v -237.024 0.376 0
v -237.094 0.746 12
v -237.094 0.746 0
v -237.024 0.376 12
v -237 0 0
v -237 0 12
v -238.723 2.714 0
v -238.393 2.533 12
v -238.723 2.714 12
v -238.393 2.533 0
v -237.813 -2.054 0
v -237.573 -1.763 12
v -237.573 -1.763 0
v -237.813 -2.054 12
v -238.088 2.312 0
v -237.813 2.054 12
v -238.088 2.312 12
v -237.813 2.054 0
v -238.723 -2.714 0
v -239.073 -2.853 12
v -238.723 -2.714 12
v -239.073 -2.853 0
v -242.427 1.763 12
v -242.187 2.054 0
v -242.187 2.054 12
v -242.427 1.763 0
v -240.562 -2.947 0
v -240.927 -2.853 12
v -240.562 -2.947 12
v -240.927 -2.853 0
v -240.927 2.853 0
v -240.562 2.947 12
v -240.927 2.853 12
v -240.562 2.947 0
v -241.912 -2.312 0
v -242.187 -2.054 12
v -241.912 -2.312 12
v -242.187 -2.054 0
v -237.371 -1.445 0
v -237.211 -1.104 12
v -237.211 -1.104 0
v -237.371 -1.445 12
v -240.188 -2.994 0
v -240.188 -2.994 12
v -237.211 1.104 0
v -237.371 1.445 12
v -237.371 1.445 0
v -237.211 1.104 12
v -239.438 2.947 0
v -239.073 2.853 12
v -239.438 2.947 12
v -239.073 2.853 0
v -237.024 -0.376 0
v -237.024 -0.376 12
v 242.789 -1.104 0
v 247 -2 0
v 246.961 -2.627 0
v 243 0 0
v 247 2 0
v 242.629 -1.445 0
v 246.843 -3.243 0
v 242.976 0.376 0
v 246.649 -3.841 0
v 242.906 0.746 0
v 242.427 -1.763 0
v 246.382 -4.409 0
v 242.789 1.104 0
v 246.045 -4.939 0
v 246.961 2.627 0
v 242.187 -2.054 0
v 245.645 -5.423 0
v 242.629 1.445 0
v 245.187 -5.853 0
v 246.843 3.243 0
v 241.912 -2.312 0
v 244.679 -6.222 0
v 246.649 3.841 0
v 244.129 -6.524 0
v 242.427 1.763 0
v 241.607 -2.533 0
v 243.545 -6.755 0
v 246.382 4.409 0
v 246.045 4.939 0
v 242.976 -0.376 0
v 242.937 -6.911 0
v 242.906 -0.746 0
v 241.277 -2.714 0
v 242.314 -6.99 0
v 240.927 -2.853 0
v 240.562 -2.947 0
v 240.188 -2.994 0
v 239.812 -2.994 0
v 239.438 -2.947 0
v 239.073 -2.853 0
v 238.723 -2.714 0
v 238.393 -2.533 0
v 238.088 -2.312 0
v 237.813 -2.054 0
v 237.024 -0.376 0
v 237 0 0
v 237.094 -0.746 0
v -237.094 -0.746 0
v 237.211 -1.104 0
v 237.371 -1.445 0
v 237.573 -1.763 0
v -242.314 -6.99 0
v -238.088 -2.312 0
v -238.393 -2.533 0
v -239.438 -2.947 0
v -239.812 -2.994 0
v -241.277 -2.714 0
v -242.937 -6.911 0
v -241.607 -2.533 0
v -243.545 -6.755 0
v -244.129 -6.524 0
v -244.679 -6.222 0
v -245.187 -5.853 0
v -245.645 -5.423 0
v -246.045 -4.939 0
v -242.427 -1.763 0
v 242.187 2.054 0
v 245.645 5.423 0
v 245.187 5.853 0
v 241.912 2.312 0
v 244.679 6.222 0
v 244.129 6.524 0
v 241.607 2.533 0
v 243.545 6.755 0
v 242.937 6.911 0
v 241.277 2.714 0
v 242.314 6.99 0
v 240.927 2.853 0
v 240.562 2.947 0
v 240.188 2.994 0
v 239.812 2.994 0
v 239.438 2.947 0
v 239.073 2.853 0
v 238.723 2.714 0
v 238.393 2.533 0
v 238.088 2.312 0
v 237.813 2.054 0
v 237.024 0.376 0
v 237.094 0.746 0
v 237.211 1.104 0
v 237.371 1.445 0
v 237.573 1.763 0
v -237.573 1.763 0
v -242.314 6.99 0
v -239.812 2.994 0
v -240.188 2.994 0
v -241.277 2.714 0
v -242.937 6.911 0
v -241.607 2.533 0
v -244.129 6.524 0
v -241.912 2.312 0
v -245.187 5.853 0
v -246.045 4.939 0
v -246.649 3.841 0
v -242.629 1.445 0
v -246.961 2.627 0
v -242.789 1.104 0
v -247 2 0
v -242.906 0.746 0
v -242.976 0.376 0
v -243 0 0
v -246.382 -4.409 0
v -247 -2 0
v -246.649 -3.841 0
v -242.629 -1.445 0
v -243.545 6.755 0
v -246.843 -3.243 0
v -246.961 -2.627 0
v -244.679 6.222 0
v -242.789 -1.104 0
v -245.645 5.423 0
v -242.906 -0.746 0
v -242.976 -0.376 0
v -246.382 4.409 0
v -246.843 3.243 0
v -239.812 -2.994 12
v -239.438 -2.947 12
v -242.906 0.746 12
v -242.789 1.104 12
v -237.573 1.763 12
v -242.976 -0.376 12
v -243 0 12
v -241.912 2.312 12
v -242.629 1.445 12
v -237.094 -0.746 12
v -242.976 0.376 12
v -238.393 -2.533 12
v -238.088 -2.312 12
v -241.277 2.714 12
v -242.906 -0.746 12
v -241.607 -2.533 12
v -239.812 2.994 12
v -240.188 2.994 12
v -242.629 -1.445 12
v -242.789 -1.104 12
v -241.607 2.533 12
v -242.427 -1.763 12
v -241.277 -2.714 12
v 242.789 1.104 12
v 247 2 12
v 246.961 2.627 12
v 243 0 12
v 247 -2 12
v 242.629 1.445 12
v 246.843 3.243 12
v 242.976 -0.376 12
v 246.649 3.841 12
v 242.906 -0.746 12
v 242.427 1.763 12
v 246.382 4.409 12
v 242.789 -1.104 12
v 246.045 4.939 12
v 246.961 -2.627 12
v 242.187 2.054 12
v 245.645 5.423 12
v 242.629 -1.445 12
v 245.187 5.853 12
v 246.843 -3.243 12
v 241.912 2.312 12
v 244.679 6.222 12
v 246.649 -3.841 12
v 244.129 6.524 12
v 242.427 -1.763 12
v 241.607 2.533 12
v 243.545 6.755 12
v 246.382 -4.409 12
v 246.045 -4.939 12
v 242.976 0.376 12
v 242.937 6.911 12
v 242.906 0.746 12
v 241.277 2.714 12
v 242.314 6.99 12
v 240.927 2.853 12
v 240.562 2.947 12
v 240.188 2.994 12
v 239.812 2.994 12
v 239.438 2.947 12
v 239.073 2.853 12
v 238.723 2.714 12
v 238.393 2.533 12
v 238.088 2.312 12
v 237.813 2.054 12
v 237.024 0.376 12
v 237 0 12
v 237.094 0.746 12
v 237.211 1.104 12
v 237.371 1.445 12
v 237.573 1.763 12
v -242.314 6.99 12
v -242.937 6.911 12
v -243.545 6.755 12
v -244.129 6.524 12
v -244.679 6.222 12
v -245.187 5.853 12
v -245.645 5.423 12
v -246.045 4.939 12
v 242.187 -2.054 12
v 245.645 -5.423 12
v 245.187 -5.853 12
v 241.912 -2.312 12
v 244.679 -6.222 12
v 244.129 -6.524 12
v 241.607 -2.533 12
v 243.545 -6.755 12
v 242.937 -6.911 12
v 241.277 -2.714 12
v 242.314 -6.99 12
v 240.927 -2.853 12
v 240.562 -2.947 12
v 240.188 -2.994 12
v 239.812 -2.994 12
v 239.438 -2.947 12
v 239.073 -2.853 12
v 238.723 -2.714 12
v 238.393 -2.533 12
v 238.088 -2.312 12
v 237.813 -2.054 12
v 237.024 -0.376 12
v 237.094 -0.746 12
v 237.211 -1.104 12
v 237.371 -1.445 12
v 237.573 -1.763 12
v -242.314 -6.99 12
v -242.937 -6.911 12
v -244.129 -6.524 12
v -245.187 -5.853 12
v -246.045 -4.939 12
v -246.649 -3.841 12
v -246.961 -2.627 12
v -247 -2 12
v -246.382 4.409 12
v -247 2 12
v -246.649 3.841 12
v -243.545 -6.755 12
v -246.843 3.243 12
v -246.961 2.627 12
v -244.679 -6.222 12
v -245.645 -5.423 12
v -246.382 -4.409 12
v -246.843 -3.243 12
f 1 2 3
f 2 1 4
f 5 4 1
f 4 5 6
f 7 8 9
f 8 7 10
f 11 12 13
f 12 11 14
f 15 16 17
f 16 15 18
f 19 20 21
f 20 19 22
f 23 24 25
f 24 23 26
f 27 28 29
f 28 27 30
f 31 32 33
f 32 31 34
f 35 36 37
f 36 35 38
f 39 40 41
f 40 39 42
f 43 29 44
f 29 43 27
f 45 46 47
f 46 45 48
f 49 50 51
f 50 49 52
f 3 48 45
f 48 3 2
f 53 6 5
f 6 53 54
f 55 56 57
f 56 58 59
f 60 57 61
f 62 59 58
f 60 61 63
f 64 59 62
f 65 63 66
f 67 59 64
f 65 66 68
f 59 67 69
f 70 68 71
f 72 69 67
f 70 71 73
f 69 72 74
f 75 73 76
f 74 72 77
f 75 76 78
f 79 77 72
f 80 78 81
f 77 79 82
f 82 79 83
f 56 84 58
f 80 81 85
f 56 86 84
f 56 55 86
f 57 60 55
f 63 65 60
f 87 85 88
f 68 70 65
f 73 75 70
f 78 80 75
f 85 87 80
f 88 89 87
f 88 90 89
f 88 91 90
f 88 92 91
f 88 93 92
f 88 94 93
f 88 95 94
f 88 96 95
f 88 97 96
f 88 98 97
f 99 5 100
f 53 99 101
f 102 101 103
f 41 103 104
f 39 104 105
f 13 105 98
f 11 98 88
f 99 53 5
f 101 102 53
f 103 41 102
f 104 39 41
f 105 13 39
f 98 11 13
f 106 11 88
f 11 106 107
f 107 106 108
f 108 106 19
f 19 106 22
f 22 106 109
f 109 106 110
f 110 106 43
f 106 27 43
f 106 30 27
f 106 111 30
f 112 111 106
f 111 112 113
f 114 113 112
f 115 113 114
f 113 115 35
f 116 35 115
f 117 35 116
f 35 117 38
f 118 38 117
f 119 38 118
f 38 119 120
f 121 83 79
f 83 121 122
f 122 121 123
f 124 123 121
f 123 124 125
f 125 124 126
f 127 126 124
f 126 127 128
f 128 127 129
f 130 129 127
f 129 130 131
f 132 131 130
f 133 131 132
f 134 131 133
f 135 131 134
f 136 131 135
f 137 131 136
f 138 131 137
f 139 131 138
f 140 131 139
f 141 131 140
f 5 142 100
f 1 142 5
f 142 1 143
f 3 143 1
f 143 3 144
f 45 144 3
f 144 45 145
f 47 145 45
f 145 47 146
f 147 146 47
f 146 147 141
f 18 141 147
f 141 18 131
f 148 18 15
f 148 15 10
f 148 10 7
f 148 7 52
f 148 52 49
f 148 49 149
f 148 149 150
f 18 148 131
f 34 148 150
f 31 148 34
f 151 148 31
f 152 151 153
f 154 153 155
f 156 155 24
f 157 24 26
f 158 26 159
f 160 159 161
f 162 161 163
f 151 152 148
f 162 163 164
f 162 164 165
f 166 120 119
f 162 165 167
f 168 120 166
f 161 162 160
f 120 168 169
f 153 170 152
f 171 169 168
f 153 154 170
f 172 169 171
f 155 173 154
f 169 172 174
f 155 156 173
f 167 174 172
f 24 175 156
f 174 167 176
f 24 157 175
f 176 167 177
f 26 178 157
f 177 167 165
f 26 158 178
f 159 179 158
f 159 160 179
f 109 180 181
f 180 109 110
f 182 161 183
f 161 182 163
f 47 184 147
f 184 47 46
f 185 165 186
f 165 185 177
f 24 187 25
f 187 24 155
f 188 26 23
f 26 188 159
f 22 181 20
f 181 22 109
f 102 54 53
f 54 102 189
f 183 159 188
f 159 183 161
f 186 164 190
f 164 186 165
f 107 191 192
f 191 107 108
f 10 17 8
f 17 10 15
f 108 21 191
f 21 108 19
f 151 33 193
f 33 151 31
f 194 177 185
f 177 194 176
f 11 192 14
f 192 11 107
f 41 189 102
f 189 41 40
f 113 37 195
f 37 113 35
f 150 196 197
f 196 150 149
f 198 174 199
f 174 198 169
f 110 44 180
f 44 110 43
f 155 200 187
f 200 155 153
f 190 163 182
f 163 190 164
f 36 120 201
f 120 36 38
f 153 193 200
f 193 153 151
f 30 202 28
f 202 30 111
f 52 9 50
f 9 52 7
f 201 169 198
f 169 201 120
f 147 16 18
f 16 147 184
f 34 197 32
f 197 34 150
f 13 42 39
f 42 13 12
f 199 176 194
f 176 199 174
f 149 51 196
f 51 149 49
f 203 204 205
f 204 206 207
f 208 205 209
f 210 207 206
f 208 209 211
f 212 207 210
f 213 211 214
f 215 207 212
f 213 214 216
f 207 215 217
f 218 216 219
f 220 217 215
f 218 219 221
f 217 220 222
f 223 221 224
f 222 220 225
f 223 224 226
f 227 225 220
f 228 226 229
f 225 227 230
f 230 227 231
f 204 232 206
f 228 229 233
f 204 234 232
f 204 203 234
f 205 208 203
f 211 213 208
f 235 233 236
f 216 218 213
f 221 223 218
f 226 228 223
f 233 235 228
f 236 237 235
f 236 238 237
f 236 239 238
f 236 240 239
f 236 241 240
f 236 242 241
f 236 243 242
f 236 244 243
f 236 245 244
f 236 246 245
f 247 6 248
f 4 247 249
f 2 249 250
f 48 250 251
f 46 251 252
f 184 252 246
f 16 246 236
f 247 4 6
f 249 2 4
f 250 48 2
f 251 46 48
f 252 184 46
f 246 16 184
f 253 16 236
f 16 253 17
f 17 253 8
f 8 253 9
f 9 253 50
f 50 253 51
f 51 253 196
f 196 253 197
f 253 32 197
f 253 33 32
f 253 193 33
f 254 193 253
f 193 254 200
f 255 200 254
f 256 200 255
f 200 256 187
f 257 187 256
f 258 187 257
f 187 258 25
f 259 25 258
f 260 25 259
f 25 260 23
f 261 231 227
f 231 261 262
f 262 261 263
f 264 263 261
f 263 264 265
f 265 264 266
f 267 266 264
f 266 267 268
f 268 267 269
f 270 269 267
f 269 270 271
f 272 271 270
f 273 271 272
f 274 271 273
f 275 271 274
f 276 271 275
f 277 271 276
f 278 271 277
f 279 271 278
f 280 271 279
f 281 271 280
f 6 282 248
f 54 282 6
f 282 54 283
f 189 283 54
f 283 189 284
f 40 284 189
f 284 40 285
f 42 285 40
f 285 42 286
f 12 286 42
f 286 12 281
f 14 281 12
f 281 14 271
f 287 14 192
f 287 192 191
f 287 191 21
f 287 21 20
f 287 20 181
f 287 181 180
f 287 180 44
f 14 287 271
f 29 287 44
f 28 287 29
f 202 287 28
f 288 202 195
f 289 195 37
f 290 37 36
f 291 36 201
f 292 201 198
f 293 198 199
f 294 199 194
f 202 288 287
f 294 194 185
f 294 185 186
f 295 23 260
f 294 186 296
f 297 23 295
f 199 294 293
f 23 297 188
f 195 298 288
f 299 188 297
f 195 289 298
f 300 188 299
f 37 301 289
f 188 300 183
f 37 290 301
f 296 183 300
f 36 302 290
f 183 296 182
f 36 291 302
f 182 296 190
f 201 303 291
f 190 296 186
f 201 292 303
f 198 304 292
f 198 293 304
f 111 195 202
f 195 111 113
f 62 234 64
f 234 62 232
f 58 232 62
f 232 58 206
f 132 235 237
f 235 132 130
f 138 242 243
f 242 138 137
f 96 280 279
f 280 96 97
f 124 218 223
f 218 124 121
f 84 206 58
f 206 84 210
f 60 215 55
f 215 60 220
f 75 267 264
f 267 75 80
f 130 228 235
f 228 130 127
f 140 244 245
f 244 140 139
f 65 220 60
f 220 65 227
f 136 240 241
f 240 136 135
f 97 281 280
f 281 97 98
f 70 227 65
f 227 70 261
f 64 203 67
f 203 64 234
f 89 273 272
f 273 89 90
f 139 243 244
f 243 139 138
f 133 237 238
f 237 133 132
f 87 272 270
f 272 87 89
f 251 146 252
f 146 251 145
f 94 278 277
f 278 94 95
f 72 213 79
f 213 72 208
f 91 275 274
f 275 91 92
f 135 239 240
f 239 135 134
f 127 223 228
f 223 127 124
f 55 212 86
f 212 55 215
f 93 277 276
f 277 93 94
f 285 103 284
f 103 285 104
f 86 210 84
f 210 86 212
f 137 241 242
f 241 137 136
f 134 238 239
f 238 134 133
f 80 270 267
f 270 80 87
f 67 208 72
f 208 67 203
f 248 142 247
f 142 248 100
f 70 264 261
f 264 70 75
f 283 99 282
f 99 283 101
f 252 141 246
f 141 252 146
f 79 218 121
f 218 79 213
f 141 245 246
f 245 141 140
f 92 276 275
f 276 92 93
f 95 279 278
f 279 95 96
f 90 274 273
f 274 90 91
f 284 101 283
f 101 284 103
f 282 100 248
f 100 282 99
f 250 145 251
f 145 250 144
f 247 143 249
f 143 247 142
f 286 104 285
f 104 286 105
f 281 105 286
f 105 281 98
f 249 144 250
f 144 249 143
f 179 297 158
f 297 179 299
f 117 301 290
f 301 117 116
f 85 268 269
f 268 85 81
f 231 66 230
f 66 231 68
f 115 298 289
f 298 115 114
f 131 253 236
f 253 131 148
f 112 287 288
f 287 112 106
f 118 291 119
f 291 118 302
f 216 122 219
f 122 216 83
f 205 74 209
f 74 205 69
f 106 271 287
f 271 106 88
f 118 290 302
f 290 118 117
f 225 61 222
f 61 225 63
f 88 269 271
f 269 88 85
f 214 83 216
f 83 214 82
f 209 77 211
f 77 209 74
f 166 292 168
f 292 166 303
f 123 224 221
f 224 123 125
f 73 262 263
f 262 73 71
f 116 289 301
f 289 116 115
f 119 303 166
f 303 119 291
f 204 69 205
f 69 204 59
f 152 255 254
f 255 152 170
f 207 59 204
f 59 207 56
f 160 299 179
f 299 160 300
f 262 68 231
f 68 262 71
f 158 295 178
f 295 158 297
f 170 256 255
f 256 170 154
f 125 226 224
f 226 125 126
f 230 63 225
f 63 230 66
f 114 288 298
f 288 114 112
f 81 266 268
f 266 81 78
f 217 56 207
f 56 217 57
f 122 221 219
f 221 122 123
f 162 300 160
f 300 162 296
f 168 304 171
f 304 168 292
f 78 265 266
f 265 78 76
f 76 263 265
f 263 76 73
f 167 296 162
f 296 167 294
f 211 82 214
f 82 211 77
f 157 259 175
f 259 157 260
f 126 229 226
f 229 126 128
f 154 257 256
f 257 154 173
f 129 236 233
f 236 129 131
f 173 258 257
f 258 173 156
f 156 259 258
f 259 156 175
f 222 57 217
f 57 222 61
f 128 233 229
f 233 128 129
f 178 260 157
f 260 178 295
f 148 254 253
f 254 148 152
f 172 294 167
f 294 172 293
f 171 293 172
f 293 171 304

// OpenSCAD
$fn = 50;


difference() {
	union() {
		hull() {
			translate(v = [-242.0000000000, 2.0000000000, 0]) {
				cylinder(h = 12, r = 5);
			}
			translate(v = [242.0000000000, 2.0000000000, 0]) {
				cylinder(h = 12, r = 5);
			}
			translate(v = [-242.0000000000, -2.0000000000, 0]) {
				cylinder(h = 12, r = 5);
			}
			translate(v = [242.0000000000, -2.0000000000, 0]) {
				cylinder(h = 12, r = 5);
			}
		}
	}
	union() {
		translate(v = [-240.0000000000, 0.0000000000, 0]) {
			cylinder(h = 12, r = 3.0000000000);
		}
		translate(v = [240.0000000000, 0.0000000000, 0]) {
			cylinder(h = 12, r = 3.0000000000);
		}
		translate(v = [-240.0000000000, 0.0000000000, 0]) {
			cylinder(h = 12, r = 1.5000000000);
		}
		translate(v = [240.0000000000, 0.0000000000, 0]) {
			cylinder(h = 12, r = 1.5000000000);
		}
		translate(v = [-240.0000000000, 0.0000000000, 0]) {
			cylinder(h = 12, r = 1.5000000000);
		}
		translate(v = [240.0000000000, 0.0000000000, 0]) {
			cylinder(h = 12, r = 1.5000000000);
		}
		translate(v = [-240.0000000000, 0.0000000000, 0]) {
			cylinder(h = 12, r = 1.5000000000);
		}
		translate(v = [240.0000000000, 0.0000000000, 0]) {
			cylinder(h = 12, r = 1.5000000000);
		}
	}
}
